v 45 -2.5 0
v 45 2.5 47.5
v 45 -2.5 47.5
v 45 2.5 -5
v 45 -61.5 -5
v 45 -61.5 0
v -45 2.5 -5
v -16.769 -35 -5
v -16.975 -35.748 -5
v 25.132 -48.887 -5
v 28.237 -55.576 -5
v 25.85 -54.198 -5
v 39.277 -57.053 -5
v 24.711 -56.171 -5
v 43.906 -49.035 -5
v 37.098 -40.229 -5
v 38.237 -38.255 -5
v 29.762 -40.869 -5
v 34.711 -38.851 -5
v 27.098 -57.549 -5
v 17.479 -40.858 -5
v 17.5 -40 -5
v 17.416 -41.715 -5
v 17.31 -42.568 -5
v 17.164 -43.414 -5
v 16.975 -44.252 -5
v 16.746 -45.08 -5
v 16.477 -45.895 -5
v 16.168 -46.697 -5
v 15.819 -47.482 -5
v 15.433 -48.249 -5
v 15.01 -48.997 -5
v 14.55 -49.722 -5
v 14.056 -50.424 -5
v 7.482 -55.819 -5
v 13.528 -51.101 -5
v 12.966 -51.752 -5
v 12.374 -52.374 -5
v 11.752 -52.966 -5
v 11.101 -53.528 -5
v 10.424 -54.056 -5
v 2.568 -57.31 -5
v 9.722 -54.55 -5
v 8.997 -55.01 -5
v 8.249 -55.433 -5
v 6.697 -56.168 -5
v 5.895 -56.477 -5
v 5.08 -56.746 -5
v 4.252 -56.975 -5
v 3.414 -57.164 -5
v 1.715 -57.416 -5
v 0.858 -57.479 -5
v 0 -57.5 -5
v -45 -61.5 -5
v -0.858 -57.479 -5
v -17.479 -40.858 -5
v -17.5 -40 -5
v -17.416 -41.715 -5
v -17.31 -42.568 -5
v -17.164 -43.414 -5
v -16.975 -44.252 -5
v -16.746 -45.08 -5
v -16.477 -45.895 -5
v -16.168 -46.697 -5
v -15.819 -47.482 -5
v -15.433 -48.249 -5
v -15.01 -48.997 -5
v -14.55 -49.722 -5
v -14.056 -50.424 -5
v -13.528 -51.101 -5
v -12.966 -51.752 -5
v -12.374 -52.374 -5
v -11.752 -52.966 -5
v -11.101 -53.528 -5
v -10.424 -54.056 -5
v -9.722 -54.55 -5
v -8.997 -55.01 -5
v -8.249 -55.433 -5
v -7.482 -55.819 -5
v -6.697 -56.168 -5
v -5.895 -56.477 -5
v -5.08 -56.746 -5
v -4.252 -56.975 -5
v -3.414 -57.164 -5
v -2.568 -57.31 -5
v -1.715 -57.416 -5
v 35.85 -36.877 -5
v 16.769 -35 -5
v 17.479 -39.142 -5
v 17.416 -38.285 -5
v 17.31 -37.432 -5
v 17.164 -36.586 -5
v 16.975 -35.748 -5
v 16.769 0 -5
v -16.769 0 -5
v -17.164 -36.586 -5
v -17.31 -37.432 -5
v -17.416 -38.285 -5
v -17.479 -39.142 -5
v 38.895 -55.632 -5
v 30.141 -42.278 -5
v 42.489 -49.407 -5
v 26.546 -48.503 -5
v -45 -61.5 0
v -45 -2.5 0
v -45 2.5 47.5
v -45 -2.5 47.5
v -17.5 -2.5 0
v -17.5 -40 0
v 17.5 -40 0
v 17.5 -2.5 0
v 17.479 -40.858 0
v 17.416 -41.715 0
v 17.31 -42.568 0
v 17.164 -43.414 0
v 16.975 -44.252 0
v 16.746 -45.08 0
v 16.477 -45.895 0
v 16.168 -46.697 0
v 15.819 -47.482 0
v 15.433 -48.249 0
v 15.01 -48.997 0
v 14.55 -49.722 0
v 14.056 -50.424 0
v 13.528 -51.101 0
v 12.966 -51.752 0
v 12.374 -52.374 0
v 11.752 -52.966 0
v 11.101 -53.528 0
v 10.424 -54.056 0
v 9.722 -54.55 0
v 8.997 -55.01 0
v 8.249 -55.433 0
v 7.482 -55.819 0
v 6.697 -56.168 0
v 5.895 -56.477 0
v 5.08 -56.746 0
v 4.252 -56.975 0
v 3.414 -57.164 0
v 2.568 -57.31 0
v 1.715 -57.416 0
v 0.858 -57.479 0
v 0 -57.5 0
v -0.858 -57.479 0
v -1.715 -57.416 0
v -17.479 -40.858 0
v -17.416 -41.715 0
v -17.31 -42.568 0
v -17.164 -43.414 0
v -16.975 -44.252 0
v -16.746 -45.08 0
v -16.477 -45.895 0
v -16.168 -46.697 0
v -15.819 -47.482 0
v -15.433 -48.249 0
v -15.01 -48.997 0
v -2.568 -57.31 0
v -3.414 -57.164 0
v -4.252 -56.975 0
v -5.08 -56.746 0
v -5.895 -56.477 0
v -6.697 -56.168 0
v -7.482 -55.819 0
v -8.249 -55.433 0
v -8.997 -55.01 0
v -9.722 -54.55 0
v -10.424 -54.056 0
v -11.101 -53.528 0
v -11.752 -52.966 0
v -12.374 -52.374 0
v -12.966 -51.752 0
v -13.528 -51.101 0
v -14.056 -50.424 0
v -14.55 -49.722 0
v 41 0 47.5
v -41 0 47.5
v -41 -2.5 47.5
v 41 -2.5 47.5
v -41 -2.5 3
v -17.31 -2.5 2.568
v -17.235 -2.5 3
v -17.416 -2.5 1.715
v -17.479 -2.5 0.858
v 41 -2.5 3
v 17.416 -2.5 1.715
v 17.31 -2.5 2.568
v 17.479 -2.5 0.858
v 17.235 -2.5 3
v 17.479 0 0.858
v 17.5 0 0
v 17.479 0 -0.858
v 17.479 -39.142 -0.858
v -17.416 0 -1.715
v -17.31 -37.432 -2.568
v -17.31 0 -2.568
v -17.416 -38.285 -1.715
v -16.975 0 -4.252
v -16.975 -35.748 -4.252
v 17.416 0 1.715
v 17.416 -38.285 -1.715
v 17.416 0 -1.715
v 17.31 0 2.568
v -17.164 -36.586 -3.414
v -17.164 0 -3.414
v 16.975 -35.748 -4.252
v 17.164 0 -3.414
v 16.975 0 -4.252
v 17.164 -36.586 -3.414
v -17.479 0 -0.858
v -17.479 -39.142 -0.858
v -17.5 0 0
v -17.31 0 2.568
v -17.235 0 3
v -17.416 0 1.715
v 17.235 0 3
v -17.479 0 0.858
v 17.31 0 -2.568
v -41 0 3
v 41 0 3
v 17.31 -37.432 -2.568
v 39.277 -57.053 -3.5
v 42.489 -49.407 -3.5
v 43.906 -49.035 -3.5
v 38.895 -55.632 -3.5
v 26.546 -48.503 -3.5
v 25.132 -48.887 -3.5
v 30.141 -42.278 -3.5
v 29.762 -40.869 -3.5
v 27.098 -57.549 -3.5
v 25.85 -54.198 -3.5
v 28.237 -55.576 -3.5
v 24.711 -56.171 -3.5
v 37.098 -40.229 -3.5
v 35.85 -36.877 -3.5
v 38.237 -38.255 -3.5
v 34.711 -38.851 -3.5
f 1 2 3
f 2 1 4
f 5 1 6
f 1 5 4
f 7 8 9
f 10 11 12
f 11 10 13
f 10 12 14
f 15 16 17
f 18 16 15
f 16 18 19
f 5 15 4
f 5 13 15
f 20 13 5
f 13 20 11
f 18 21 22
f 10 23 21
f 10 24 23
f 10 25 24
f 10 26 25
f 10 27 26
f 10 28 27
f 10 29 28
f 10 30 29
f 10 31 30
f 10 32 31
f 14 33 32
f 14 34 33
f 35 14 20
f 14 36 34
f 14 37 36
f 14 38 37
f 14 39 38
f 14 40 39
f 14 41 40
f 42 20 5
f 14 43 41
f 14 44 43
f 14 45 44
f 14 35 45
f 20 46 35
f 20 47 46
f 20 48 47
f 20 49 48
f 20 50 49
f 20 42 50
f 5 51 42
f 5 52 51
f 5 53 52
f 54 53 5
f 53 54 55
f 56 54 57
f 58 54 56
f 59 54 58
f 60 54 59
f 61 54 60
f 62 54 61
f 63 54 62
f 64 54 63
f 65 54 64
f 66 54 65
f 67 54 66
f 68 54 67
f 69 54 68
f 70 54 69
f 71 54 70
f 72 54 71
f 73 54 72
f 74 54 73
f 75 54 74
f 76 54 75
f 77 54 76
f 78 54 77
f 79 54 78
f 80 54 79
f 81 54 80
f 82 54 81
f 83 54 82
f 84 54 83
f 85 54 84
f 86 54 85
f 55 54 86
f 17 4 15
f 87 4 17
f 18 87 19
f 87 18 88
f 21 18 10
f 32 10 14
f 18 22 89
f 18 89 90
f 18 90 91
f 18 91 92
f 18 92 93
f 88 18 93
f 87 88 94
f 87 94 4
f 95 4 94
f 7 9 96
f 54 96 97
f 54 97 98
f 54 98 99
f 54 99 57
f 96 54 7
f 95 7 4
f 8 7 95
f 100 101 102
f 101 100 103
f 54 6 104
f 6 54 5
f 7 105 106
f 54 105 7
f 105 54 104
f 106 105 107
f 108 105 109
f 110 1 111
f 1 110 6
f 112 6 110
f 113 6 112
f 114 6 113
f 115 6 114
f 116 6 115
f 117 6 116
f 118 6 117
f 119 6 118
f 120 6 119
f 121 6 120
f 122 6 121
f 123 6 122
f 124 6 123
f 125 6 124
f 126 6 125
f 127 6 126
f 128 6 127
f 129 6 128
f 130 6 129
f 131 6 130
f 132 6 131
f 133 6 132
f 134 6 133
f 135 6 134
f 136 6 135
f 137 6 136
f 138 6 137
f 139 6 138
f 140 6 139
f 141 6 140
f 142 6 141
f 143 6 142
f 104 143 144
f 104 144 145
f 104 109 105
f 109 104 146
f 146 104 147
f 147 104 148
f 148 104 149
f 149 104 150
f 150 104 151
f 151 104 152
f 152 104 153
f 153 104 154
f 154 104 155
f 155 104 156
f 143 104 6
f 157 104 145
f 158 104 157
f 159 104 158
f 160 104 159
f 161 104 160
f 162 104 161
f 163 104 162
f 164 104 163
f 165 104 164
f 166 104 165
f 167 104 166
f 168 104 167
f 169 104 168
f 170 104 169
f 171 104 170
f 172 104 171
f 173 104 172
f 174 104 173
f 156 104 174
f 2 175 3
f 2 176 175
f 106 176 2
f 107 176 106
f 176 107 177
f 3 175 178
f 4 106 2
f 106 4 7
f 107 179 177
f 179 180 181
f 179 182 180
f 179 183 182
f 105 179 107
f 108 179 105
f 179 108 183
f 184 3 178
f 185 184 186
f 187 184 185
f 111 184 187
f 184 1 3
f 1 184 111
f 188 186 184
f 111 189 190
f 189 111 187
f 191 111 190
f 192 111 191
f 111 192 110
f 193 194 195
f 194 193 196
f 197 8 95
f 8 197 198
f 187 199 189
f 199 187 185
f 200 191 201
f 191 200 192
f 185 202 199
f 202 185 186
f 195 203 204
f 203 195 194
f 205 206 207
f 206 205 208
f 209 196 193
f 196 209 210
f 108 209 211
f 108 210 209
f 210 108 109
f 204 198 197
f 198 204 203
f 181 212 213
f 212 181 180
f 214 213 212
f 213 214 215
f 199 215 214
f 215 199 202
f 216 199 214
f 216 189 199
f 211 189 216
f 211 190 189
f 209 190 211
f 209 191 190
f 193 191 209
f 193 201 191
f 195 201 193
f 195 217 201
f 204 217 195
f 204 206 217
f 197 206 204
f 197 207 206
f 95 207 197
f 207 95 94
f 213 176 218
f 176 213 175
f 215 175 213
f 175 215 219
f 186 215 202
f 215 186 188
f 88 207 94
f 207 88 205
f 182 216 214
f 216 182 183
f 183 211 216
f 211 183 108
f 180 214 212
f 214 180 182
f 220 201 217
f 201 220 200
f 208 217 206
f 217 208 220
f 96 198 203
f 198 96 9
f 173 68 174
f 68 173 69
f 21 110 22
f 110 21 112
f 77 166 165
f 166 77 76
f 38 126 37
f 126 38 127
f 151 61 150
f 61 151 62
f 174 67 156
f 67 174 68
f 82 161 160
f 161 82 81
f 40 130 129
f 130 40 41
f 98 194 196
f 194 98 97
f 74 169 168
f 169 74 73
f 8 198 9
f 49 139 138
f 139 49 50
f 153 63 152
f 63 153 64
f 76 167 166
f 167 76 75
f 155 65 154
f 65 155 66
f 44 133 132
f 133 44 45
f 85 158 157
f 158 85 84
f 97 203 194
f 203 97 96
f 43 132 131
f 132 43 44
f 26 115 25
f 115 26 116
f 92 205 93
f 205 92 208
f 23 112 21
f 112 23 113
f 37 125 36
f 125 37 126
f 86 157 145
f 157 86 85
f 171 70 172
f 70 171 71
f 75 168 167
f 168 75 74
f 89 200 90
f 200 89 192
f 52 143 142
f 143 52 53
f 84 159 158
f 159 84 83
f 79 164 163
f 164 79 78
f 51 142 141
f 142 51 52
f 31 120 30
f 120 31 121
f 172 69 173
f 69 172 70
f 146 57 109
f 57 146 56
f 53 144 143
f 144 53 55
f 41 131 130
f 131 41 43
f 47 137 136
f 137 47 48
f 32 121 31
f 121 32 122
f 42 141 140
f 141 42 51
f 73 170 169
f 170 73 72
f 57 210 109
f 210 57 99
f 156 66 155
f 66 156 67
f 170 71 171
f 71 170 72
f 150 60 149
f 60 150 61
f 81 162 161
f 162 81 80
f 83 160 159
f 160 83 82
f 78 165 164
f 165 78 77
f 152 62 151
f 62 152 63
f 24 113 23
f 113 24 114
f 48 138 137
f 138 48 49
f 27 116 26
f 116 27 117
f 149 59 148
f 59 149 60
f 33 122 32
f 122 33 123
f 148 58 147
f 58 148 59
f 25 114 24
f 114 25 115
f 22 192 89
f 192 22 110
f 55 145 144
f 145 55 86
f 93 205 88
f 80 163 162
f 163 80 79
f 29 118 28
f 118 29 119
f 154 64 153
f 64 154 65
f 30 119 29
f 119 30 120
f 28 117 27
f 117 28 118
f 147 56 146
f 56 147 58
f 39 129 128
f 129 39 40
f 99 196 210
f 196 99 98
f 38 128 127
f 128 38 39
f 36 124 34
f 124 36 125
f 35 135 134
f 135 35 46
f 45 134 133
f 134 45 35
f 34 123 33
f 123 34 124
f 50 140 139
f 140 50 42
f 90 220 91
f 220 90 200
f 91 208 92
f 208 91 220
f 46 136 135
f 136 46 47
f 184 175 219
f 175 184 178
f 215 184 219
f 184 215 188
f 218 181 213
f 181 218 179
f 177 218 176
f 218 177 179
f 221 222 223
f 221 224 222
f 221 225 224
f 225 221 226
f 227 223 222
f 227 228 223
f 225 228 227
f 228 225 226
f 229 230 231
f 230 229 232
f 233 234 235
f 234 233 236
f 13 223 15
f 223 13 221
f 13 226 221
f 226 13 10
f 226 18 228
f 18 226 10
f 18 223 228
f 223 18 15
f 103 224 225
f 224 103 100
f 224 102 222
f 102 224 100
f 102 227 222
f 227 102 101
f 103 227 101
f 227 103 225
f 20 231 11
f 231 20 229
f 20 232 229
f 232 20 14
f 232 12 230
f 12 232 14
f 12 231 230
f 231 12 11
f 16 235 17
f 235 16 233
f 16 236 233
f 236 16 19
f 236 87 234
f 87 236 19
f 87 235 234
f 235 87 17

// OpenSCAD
rotate([90.0, 0.0, 0.0])
{
    difference()
    {
        union()
        {
            translate([0.0, -2.5, 0.0])
            {
                linear_extrude(height = 61.5, twist = 0.0, scale = 1.0, slices = 1, center = false)
                {
                    scale([90.0, 5.0])
                    {
                        M22();
                    }
                }
            }
            rotate([90.0, 0.0, 0.0])
            {
                translate([0.0, 0.0, -47.5])
                {
                    linear_extrude(height = 52.5, twist = 0.0, scale = 1.0, slices = 1, center = false)
                    {
                        scale([90.0, 5.0])
                        {
                            M22();
                        }
                    }
                }
            }
        }
        linear_extrude(height = 40.0, twist = 0.0, scale = 1.0, slices = 1, center = false)
        {
            scale([35.0, 35.0])
            {
                M490();
            }
        }
        translate([0.0, 41.0, 0.0])
        {
            translate([0.0, 0.0, 40.0])
            {
                rotate([90.0, 0.0, 0.0])
                {
                    linear_extrude(height = 110.0, twist = 0.0, scale = 1.0, slices = 1, center = false)
                    {
                        scale([35.0, 35.0])
                        {
                            M490();
                        }
                    }
                }
            }
        }
        translate([0.0, 30.0, 0.0])
        {
            linear_extrude(height = 80.0, twist = 0.0, scale = 1.0, slices = 1, center = false)
            {
                scale([82.0, 54.0])
                {
                    M22();
                }
            }
        }
        translate([0.0, -5.0, 0.0])
        {
            translate([22.5, 0.0, 0.0])
            {
                translate([0.0, 0.0, 60.0])
                {
                    rotate([0.0, 60.00000000000001, 0.0])
                    {
                        rotate([90.0, 0.0, 0.0])
                        {
                            linear_extrude(height = 3.0, twist = 0.0, scale = 1.0, slices = 1, center = true)
                            {
                                union()
                                {
                                    translate([0.0, 0.0])
                                    {
                                        M1028();
                                    }
                                    translate([10.0, 0.0])
                                    {
                                        M1029();
                                    }
                                    translate([20.0, 0.0])
                                    {
                                        M1028();
                                    }
                                }
                            }
                        }
                    }
                }
            }
        }
    }
}

module M1028()
{
    scale([1.3333333333333333, 1.3333333333333333])
    {
        text
        (
            text = ".",
            size = 10.0,
            font = "Consolas:style=Regular",
            halign = "left",
            valign = "baseline",
            spacing = 1.0,
            direction = "ltr",
            language = "en",
            script = "latin",
            $fn = 64
        );
    }
}

module M1029()
{
    scale([1.3333333333333333, 1.3333333333333333])
    {
        text
        (
            text = "͜",
            size = 10.0,
            font = "Consolas:style=Regular",
            halign = "left",
            valign = "baseline",
            spacing = 1.0,
            direction = "ltr",
            language = "en",
            script = "latin",
            $fn = 64
        );
    }
}

module M22()
{
    polygon
    (
        points =
        [
            [-0.5, -0.5], 
            [0.5, -0.5], 
            [0.5, 0.5], 
            [-0.5, 0.5]
        ],
        paths =
        [
            [0, 1, 2, 3]
        ]
    );
}

module M490()
{
    polygon
    (
        points =
        [
            [0.5, 0.0], 
            [0.4993977281025862, 0.024533837163709007], 
            [0.49759236333609846, 0.0490085701647803], 
            [0.4945882549823905, 0.07336523722768087], 
            [0.4903926402016152, 0.09754516100806412], 
            [0.485015626597272, 0.12149008995163194], 
            [0.4784701678661044, 0.14514233862723117], 
            [0.4707720325915104, 0.16844492669611003], 
            [0.46193976625564337, 0.1913417161825449], 
            [0.45199464656172167, 0.21377754671514104], 
            [0.4409606321741775, 0.23569836841299882], 
            [0.42886430500013606, 0.25705137209661083], 
            [0.4157348061512726, 0.2777851165098011], 
            [0.40160376574032247, 0.2978496522462167], 
            [0.3865052266813685, 0.31719664208182274], 
            [0.37047556267747955, 0.33577947742350917], 
            [0.3535533905932738, 0.35355339059327373], 
            [0.33577947742350917, 0.37047556267747955], 
            [0.31719664208182274, 0.3865052266813685], 
            [0.29784965224621673, 0.4016037657403224], 
            [0.27778511650980114, 0.4157348061512726], 
            [0.25705137209661083, 0.42886430500013606], 
            [0.2356983684129989, 0.44096063217417747], 
            [0.2137775467151411, 0.45199464656172167], 
            [0.19134171618254492, 0.46193976625564337], 
            [0.16844492669611003, 0.4707720325915104], 
            [0.14514233862723117, 0.47847016786610447], 
            [0.12149008995163199, 0.485015626597272], 
            [0.09754516100806417, 0.4903926402016152], 
            [0.07336523722768087, 0.4945882549823905], 
            [0.049008570164780385, 0.4975923633360984], 
            [0.024533837163709063, 0.4993977281025862], 
            [3.061616997868383E-17, 0.5], 
            [-0.024533837163709004, 0.4993977281025862], 
            [-0.04900857016478032, 0.49759236333609846], 
            [-0.07336523722768082, 0.4945882549823905], 
            [-0.0975451610080641, 0.4903926402016152], 
            [-0.12149008995163194, 0.485015626597272], 
            [-0.14514233862723108, 0.47847016786610447], 
            [-0.16844492669610997, 0.4707720325915104], 
            [-0.19134171618254486, 0.46193976625564337], 
            [-0.21377754671514093, 0.4519946465617217], 
            [-0.23569836841299885, 0.4409606321741775], 
            [-0.25705137209661083, 0.42886430500013606], 
            [-0.277785116509801, 0.41573480615127273], 
            [-0.2978496522462167, 0.40160376574032247], 
            [-0.3171966420818227, 0.38650522668136855], 
            [-0.3357794774235092, 0.3704755626774795], 
            [-0.35355339059327373, 0.3535533905932738], 
            [-0.37047556267747944, 0.3357794774235093], 
            [-0.3865052266813685, 0.31719664208182274], 
            [-0.4016037657403224, 0.29784965224621673], 
            [-0.4157348061512727, 0.2777851165098011], 
            [-0.428864305000136, 0.2570513720966109], 
            [-0.44096063217417747, 0.23569836841299893], 
            [-0.45199464656172167, 0.21377754671514101], 
            [-0.46193976625564337, 0.19134171618254495], 
            [-0.47077203259151035, 0.16844492669611016], 
            [-0.4784701678661044, 0.1451423386272312], 
            [-0.485015626597272, 0.12149008995163203], 
            [-0.4903926402016152, 0.0975451610080643], 
            [-0.4945882549823905, 0.0733652372276809], 
            [-0.4975923633360984, 0.04900857016478041], 
            [-0.4993977281025862, 0.024533837163708983], 
            [-0.5, 6.123233995736766E-17], 
            [-0.4993977281025862, -0.024533837163708862], 
            [-0.49759236333609846, -0.049008570164780295], 
            [-0.4945882549823905, -0.07336523722768079], 
            [-0.4903926402016152, -0.09754516100806418], 
            [-0.485015626597272, -0.12149008995163191], 
            [-0.47847016786610447, -0.14514233862723105], 
            [-0.4707720325915104, -0.16844492669611005], 
            [-0.4619397662556434, -0.19134171618254484], 
            [-0.4519946465617217, -0.2137775467151409], 
            [-0.4409606321741775, -0.23569836841299882], 
            [-0.42886430500013606, -0.2570513720966108], 
            [-0.41573480615127273, -0.277785116509801], 
            [-0.40160376574032247, -0.2978496522462166], 
            [-0.38650522668136855, -0.31719664208182263], 
            [-0.37047556267747955, -0.3357794774235092], 
            [-0.35355339059327384, -0.35355339059327373], 
            [-0.33577947742350933, -0.37047556267747944], 
            [-0.31719664208182297, -0.38650522668136833], 
            [-0.29784965224621657, -0.4016037657403225], 
            [-0.2777851165098011, -0.4157348061512726], 
            [-0.2570513720966109, -0.428864305000136], 
            [-0.23569836841299893, -0.44096063217417747], 
            [-0.21377754671514124, -0.45199464656172156], 
            [-0.19134171618254517, -0.46193976625564326], 
            [-0.16844492669610997, -0.4707720325915104], 
            [-0.14514233862723122, -0.4784701678661044], 
            [-0.12149008995163206, -0.485015626597272], 
            [-0.09754516100806433, -0.49039264020161516], 
            [-0.07336523722768115, -0.49458825498239045], 
            [-0.049008570164780225, -0.49759236333609846], 
            [-0.024533837163709014, -0.4993977281025862], 
            [-9.184850993605148E-17, -0.5], 
            [0.02453383716370883, -0.4993977281025862], 
            [0.049008570164780045, -0.49759236333609846], 
            [0.07336523722768097, -0.49458825498239045], 
            [0.09754516100806415, -0.4903926402016152], 
            [0.12149008995163188, -0.485015626597272], 
            [0.14514233862723103, -0.47847016786610447], 
            [0.1684449266961098, -0.47077203259151046], 
            [0.191341716182545, -0.4619397662556433], 
            [0.21377754671514107, -0.45199464656172167], 
            [0.2356983684129988, -0.4409606321741775], 
            [0.2570513720966108, -0.4288643050001361], 
            [0.2777851165098009, -0.41573480615127273], 
            [0.29784965224621646, -0.40160376574032264], 
            [0.3171966420818228, -0.38650522668136844], 
            [0.33577947742350917, -0.37047556267747955], 
            [0.3535533905932737, -0.35355339059327384], 
            [0.37047556267747944, -0.33577947742350933], 
            [0.38650522668136833, -0.31719664208182297], 
            [0.4016037657403225, -0.2978496522462166], 
            [0.4157348061512726, -0.2777851165098011], 
            [0.428864305000136, -0.25705137209661094], 
            [0.4409606321741774, -0.23569836841299896], 
            [0.45199464656172156, -0.21377754671514126], 
            [0.46193976625564326, -0.1913417161825452], 
            [0.4707720325915104, -0.16844492669611], 
            [0.4784701678661044, -0.14514233862723125], 
            [0.485015626597272, -0.12149008995163209], 
            [0.49039264020161516, -0.09754516100806436], 
            [0.49458825498239045, -0.0733652372276812], 
            [0.49759236333609846, -0.04900857016478025], 
            [0.4993977281025862, -0.024533837163709046]
        ],
        paths =
        [
            [0, 1, 2, 3, 4, 5, 6, 7, 8, 9, 10, 11, 12, 13, 14, 15, 16, 17, 18, 19, 20, 21, 22, 23, 24, 25, 26, 27, 28, 29, 30, 31, 32, 33, 34, 35, 36, 37, 38, 39, 40, 41, 42, 43, 44, 45, 46, 47, 48, 49, 50, 51, 52, 53, 54, 55, 56, 57, 58, 59, 60, 61, 62, 63, 64, 65, 66, 67, 68, 69, 70, 71, 72, 73, 74, 75, 76, 77, 78, 79, 80, 81, 82, 83, 84, 85, 86, 87, 88, 89, 90, 91, 92, 93, 94, 95, 96, 97, 98, 99, 100, 101, 102, 103, 104, 105, 106, 107, 108, 109, 110, 111, 112, 113, 114, 115, 116, 117, 118, 119, 120, 121, 122, 123, 124, 125, 126, 127]
        ]
    );
}
